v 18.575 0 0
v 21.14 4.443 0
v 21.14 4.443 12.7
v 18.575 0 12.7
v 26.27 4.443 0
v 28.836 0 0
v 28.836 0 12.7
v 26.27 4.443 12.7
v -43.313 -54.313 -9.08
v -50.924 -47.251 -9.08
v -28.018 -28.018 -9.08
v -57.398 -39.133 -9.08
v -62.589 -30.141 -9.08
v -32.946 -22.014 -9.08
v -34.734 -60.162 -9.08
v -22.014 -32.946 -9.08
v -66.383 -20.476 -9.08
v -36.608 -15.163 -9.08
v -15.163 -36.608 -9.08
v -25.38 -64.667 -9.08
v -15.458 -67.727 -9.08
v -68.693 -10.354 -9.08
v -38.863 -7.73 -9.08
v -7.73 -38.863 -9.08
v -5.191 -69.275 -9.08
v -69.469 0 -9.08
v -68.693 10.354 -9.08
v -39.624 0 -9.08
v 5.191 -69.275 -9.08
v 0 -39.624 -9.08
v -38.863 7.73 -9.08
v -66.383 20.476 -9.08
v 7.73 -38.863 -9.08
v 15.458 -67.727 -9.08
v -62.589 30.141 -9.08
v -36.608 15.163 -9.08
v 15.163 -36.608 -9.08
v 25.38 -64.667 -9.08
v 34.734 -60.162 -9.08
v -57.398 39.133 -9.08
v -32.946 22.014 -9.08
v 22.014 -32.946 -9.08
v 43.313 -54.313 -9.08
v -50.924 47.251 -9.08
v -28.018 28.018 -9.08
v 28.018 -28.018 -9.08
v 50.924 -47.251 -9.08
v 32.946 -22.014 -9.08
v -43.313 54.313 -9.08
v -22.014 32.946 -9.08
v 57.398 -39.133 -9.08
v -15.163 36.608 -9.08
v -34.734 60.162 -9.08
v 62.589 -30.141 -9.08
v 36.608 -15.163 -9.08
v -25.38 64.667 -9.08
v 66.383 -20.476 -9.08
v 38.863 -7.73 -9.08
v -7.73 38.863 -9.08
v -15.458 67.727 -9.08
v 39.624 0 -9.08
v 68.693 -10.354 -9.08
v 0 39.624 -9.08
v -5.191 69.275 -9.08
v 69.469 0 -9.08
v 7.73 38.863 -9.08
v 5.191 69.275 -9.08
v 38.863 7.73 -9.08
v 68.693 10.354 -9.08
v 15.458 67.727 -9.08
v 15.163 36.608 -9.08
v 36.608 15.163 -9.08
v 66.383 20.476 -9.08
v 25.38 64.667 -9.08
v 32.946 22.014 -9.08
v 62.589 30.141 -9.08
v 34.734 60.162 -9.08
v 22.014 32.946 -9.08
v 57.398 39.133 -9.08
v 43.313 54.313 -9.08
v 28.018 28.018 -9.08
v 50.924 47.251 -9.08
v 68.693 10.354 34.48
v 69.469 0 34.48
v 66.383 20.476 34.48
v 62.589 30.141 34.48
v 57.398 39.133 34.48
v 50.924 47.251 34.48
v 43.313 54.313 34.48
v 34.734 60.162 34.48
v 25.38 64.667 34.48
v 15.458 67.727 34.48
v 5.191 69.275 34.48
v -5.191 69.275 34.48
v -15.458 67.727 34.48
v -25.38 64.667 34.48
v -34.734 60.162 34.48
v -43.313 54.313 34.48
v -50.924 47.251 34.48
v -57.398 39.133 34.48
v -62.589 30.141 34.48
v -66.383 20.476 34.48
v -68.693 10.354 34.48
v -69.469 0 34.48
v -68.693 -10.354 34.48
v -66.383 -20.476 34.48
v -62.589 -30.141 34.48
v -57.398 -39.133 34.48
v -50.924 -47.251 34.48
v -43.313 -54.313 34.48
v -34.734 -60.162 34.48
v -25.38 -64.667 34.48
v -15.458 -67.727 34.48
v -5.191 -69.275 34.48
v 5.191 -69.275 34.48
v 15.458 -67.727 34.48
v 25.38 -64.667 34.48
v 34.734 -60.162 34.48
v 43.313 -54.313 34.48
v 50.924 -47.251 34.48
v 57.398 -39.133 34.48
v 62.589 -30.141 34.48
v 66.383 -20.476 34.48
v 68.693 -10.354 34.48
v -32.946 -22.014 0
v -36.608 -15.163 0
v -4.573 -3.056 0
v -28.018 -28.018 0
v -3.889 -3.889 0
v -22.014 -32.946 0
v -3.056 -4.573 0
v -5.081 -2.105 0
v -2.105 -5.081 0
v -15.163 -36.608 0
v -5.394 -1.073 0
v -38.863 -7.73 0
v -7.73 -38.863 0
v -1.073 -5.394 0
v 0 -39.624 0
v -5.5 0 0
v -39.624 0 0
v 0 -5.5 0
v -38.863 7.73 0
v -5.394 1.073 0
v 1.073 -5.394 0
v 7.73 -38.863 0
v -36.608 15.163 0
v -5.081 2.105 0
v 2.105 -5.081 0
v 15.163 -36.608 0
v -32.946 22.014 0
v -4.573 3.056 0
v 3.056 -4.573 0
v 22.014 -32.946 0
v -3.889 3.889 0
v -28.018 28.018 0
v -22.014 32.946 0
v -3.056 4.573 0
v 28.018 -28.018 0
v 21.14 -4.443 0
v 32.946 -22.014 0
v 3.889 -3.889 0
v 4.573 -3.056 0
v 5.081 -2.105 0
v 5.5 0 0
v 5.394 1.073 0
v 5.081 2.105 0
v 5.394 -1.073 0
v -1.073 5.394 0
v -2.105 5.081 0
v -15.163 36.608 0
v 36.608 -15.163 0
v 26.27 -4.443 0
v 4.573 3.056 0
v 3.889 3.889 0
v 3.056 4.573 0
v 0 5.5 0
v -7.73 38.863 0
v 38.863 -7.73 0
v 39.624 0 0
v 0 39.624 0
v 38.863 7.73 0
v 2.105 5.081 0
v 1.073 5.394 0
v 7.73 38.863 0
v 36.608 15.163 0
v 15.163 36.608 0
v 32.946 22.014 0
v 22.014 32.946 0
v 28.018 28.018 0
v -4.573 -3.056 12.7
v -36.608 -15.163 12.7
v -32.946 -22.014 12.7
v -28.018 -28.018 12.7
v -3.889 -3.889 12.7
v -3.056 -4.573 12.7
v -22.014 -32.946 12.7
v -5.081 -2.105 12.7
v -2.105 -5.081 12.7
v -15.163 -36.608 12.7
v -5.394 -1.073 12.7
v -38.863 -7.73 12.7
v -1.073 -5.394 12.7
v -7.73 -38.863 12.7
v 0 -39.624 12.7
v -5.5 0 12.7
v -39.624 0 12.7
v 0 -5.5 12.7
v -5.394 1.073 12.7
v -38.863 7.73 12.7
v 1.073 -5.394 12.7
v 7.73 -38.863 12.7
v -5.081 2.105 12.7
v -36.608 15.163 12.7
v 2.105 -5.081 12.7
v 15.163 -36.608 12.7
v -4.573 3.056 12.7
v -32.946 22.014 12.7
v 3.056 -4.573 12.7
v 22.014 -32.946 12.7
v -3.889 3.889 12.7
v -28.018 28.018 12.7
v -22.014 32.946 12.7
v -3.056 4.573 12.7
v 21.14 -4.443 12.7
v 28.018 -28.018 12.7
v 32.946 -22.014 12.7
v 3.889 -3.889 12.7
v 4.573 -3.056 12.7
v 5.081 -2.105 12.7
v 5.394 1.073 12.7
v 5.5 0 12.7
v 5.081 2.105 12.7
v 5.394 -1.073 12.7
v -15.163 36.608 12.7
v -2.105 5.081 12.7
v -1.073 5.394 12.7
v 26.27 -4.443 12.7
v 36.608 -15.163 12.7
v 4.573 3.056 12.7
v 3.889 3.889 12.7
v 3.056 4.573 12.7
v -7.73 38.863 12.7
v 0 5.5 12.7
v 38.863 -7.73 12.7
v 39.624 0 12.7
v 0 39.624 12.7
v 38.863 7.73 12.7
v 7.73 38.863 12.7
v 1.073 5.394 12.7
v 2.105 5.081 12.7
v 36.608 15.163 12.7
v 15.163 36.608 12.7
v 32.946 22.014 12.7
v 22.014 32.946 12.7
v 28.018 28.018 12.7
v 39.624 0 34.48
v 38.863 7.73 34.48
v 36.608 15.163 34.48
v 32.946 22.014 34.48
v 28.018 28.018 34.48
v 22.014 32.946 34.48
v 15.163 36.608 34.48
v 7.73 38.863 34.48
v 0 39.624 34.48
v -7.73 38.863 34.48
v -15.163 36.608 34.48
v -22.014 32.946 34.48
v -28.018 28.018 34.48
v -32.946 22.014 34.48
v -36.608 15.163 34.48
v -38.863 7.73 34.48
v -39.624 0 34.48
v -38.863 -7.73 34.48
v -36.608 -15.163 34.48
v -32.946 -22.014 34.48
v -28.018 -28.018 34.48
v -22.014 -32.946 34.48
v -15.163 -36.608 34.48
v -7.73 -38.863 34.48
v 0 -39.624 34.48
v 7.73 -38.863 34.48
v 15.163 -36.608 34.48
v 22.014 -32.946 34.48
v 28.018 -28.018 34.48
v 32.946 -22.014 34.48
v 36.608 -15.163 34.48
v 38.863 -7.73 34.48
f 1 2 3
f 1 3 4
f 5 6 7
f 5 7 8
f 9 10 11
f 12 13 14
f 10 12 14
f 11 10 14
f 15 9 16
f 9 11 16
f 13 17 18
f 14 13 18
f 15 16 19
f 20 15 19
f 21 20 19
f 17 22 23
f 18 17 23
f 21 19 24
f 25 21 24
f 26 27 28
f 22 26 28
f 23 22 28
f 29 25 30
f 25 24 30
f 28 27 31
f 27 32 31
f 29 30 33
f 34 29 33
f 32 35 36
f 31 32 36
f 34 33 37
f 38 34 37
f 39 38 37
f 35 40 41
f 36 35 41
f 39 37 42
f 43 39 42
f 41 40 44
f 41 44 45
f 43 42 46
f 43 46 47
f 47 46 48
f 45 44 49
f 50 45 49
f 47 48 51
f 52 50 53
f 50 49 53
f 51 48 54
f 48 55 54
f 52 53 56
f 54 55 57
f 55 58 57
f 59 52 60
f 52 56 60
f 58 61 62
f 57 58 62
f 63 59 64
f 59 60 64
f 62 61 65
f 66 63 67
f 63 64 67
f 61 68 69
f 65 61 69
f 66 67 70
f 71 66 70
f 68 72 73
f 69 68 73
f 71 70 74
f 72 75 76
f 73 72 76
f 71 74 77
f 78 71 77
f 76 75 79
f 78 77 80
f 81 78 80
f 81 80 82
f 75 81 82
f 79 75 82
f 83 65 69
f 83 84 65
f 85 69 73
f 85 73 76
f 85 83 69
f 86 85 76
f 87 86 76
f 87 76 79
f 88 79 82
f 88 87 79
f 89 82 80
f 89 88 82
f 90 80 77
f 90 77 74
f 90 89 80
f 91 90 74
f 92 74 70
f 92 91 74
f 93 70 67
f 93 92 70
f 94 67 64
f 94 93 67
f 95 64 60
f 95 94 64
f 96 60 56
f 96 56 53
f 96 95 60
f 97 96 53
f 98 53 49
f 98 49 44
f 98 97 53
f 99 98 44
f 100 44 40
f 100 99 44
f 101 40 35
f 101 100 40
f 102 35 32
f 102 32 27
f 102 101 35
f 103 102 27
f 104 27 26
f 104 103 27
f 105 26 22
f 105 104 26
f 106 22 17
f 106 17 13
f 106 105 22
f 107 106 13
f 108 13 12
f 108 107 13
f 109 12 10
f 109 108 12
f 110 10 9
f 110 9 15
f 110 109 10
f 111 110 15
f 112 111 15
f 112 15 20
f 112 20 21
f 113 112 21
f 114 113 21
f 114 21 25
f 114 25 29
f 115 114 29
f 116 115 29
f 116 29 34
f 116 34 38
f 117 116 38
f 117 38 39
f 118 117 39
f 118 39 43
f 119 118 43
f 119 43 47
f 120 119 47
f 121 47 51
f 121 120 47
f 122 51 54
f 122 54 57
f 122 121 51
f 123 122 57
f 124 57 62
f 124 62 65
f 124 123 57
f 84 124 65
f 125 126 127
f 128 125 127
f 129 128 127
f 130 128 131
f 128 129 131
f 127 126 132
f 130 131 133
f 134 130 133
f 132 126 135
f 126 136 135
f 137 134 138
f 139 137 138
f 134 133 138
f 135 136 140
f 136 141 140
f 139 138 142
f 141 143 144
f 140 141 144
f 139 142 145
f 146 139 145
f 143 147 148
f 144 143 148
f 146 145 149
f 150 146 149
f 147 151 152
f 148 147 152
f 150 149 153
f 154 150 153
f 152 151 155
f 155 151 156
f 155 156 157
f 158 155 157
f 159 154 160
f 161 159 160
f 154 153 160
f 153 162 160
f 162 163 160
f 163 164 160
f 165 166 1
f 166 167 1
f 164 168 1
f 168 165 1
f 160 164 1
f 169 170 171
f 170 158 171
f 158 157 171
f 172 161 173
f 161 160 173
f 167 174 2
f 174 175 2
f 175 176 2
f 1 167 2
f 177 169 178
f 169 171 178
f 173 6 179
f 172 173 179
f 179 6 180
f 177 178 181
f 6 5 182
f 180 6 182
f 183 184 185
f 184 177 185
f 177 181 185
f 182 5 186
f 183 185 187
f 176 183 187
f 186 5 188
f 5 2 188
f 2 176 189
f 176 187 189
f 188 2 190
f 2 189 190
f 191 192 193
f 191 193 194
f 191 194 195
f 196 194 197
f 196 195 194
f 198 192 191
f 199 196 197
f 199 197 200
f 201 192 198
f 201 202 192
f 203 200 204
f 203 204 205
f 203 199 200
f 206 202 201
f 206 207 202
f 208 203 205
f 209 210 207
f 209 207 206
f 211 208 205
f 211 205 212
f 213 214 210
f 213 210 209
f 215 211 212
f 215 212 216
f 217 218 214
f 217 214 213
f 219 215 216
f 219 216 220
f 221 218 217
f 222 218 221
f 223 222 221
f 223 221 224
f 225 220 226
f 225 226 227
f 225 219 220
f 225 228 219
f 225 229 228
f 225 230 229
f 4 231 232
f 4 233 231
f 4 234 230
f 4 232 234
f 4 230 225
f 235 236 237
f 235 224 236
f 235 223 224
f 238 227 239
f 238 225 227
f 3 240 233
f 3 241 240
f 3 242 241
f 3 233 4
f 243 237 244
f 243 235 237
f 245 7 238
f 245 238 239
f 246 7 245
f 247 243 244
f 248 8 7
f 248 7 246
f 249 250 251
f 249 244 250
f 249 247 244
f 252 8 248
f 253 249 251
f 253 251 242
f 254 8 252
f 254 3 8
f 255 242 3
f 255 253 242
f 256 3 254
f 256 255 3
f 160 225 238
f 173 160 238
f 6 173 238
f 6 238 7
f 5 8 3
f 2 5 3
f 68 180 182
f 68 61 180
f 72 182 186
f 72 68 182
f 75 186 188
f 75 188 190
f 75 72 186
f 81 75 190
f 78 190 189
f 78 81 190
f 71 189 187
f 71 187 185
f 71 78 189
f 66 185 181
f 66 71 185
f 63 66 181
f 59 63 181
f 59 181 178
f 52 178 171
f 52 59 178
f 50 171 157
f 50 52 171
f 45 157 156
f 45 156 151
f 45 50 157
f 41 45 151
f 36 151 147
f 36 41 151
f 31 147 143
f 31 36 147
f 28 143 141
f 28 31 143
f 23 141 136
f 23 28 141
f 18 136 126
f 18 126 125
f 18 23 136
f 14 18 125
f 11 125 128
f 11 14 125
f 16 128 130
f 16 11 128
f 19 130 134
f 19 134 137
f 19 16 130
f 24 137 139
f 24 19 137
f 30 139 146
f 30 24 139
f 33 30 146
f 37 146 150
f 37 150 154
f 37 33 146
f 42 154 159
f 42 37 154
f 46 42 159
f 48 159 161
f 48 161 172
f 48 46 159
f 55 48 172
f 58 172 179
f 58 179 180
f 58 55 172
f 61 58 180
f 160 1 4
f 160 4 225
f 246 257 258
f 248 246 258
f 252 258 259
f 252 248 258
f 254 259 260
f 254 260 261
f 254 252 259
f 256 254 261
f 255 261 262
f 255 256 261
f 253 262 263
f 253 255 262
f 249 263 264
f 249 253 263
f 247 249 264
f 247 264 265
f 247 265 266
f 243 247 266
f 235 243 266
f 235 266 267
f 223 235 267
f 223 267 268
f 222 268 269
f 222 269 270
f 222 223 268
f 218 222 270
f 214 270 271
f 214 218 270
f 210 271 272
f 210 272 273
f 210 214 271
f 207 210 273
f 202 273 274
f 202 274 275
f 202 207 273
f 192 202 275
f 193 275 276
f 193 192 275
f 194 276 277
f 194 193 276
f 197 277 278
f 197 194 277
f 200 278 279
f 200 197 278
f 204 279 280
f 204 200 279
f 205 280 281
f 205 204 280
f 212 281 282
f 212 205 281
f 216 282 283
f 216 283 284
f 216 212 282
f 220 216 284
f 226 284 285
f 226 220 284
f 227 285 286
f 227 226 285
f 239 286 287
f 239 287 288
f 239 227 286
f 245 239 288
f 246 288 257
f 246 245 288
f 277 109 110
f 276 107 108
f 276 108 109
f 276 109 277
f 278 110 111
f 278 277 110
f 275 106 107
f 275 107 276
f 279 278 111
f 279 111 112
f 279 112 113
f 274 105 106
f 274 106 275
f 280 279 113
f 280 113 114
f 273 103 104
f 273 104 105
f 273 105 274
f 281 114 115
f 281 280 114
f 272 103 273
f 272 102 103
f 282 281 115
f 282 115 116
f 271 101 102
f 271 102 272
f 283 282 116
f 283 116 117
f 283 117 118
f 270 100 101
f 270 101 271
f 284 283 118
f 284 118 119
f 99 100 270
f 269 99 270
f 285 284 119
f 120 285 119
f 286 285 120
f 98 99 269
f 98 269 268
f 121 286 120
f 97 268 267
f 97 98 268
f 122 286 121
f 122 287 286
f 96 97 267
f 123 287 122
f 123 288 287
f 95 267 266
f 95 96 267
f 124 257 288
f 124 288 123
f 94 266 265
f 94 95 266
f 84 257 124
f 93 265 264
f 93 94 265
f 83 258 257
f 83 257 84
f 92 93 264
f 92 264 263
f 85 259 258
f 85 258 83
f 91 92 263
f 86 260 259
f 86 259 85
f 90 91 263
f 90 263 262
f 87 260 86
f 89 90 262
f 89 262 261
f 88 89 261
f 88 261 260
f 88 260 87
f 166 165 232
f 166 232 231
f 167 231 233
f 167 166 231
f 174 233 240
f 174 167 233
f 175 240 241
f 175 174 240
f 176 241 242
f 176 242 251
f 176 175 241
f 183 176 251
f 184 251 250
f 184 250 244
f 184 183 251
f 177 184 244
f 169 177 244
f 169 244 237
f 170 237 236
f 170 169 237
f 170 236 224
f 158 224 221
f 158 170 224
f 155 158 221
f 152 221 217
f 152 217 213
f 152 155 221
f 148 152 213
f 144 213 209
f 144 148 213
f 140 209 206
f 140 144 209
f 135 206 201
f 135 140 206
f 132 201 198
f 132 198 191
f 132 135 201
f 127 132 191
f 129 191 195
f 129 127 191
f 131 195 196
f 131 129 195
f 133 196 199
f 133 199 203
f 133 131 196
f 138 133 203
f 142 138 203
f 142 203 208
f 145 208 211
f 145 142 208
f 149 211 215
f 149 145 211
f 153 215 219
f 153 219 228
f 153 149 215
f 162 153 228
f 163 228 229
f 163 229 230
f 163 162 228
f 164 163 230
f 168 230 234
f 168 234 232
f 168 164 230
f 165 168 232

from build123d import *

# Parameters (mm, degrees)
F0_R     = 39.624
F0_R_2   = 5.500002
F1_DEPTH = 12.7
F2_R     = 69.469
F2_R_2   = 39.624
F3_DEPTH = 21.7805
F5_DEPTH = 45.212


with BuildPart() as f1:
    # F0 (on Top) → F1 (new body)
    with BuildSketch(Plane.XY):
        Circle(F0_R)
        Circle(F0_R_2, mode=Mode.SUBTRACT)
    extrude(amount=F1_DEPTH)

    # F2 (on face) → F3 (join, symmetric)
    with BuildSketch(Plane.XY.offset(12.7)):
        Circle(F2_R)
        Circle(F2_R_2, mode=Mode.SUBTRACT)
    extrude(amount=F3_DEPTH, both=True)

    # F4 (on face) → F5 (cut)
    with BuildSketch(Plane.XY.offset(12.7)):
        Polygon((21.139988, -4.44315), (26.270496, -4.44315), (28.83575, 0), (26.270496, 4.44315), (21.139988, 4.44315), (18.574734, 0), align=None)
    extrude(amount=-F5_DEPTH, mode=Mode.SUBTRACT)


solid = f1.part
